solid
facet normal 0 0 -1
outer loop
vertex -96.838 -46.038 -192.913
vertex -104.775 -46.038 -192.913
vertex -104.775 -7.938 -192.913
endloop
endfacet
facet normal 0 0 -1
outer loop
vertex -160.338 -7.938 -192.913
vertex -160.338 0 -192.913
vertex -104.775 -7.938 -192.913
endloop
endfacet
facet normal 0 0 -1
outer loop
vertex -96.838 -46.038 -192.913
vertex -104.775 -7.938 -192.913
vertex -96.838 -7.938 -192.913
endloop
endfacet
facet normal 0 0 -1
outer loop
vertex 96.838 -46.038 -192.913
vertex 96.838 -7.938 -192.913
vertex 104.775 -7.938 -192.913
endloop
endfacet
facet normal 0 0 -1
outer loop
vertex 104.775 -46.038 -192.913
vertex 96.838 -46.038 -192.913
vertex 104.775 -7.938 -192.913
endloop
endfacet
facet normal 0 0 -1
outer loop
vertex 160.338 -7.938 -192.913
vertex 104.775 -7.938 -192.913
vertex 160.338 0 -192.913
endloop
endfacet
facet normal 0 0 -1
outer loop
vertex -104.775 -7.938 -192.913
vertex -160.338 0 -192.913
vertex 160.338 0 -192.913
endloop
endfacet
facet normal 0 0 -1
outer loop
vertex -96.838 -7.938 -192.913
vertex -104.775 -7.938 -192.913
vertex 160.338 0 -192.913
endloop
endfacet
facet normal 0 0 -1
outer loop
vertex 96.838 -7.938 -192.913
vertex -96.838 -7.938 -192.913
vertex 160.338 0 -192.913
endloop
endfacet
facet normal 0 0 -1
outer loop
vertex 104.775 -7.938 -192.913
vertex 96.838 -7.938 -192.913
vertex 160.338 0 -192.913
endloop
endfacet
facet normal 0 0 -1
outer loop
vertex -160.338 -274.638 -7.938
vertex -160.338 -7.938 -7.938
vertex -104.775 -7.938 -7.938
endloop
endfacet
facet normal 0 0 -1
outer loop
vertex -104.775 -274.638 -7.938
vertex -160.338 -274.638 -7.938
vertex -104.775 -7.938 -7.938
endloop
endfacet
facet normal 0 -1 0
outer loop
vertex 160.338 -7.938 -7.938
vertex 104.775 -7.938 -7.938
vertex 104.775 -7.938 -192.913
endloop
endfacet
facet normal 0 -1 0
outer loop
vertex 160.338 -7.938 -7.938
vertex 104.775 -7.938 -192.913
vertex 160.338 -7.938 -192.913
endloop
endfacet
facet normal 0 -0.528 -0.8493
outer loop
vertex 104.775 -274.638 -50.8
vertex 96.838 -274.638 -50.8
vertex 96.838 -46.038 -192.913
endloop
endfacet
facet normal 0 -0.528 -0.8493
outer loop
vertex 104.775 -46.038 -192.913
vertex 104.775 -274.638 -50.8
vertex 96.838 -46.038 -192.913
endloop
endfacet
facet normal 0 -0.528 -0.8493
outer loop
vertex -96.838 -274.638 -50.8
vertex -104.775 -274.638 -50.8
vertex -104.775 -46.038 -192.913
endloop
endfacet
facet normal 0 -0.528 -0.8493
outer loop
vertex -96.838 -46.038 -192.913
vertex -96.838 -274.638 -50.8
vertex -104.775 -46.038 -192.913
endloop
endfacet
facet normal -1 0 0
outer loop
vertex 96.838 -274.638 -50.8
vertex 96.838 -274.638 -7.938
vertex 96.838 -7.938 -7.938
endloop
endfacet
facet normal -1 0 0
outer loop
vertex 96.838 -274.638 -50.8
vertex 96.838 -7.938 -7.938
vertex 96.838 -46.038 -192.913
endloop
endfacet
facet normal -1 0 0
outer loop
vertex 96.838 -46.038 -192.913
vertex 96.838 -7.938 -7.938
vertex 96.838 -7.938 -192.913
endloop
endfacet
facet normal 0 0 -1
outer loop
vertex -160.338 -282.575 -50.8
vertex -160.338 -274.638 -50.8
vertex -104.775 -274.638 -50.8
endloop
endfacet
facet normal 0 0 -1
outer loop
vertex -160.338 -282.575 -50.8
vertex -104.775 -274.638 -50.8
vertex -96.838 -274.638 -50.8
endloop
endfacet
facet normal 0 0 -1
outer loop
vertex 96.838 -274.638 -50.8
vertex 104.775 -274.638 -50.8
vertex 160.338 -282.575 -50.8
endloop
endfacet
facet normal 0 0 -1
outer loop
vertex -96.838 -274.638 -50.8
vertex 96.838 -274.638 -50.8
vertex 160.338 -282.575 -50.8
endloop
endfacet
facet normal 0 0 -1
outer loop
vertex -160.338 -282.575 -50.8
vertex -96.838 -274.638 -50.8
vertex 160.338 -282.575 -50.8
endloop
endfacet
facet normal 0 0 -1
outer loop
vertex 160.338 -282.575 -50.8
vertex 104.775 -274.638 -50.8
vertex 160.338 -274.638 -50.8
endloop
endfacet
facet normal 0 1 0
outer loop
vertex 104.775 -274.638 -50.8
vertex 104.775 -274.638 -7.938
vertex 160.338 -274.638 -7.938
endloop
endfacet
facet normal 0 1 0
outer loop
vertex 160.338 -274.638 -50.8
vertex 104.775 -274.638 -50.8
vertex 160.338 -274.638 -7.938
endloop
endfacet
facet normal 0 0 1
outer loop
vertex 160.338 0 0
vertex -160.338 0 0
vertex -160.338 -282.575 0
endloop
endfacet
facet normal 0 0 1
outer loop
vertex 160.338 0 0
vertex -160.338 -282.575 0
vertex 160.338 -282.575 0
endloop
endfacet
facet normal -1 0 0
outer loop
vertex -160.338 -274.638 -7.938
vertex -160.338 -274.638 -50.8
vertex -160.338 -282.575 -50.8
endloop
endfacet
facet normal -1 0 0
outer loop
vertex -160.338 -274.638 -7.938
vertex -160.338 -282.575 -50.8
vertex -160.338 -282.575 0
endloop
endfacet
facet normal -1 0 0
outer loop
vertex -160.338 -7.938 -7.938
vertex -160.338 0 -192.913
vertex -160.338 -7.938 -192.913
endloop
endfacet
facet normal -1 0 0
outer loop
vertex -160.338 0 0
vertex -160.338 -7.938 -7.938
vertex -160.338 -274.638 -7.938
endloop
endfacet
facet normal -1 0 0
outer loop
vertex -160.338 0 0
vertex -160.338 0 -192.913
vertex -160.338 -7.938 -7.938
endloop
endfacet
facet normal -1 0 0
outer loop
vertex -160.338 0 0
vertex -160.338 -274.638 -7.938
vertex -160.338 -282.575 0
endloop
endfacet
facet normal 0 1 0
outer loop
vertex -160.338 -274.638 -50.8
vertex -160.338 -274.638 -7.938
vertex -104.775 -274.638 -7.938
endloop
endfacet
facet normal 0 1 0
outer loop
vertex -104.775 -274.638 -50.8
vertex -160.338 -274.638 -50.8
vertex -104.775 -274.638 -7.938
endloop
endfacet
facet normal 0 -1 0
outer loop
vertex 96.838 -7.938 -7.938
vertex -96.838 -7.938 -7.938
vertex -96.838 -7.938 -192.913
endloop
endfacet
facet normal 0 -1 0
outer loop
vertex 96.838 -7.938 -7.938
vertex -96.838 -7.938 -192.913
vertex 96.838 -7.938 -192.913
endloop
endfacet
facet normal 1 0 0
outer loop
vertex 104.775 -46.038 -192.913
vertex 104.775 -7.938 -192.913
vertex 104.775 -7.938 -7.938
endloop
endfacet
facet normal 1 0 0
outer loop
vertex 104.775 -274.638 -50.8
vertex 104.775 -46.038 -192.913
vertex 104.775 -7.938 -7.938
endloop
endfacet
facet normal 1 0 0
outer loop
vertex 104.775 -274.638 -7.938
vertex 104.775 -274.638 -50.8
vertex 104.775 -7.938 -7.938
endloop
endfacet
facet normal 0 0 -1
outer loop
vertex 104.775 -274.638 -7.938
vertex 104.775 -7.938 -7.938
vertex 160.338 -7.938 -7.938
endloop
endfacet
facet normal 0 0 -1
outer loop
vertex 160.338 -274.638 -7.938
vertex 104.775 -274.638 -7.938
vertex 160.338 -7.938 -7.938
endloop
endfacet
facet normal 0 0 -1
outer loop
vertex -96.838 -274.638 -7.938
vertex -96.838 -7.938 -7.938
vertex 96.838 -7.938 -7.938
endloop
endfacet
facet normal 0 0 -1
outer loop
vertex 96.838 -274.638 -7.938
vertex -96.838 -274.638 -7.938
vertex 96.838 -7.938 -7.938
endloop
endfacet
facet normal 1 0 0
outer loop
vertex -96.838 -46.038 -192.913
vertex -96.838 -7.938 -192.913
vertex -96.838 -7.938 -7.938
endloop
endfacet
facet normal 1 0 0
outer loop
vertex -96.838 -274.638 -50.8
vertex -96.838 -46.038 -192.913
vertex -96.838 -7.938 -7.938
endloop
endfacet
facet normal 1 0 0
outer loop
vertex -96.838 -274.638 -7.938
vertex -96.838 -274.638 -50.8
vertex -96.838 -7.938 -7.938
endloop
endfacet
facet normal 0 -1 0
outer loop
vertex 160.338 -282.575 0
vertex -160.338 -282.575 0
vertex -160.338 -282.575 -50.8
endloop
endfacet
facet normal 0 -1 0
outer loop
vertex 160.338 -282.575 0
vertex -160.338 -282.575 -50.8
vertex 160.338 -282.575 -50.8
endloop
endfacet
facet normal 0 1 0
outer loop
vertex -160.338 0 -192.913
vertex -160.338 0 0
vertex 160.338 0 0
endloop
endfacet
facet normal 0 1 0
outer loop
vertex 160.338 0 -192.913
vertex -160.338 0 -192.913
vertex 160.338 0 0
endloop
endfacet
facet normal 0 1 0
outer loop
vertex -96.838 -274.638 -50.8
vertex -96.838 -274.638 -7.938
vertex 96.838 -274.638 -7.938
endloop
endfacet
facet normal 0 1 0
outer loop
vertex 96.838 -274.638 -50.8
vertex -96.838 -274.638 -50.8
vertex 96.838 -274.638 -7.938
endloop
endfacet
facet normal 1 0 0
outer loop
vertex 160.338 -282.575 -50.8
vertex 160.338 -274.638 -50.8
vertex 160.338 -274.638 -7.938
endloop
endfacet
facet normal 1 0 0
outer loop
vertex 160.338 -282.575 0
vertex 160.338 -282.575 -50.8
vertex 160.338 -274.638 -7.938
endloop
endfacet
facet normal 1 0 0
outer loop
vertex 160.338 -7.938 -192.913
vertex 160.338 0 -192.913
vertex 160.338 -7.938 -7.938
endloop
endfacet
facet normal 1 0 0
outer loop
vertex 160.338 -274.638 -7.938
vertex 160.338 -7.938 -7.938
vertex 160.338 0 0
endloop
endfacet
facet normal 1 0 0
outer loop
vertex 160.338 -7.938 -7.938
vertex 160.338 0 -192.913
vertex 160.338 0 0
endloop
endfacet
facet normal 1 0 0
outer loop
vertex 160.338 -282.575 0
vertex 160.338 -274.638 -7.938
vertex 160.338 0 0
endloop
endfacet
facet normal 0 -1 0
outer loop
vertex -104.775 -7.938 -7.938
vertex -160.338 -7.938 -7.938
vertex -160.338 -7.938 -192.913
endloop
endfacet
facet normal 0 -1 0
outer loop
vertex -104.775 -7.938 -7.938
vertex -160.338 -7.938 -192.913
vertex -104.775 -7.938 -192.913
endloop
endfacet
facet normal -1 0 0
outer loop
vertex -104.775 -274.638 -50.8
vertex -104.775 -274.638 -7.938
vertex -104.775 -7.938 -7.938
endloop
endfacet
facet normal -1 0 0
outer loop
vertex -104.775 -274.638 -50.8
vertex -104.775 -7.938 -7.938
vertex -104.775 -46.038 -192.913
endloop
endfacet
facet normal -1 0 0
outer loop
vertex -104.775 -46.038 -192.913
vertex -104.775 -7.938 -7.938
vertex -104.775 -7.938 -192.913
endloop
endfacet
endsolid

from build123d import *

# Parameters (mm, degrees)
F0_W     = 320.675
F0_H     = 192.913
F1_DEPTH = 7.9375
F4_DEPTH = 266.7
F6_DEPTH = 265.1135
F8_W     = 320.675
F8_H     = 50.8
F9_DEPTH = 7.9375


with BuildPart() as f1:
    # F0 (on Front) → F1 (new body)
    with BuildSketch(Plane.XZ):
        with Locations((0, -96.4565)):
            Rectangle(F0_W, F0_H)
    extrude(amount=F1_DEPTH)

    # F3 (on face) → F4 (join)
    with BuildSketch(Plane.XZ.offset(7.9375)):
        Polygon((160.3375, 0), (-160.3375, 0), (-160.3375, -7.9375), (-104.775, -7.9375), (-104.775, -192.913), (-96.8375, -192.913), (-96.8375, -7.9375), (96.8375, -7.9375), (96.8375, -192.913), (104.775, -192.913), (104.775, -7.9375), (160.3375, -7.9375), align=None)
    extrude(amount=F4_DEPTH)

    # F5 (on face) → F6 (cut, through all)
    with BuildSketch(Plane(origin=(-104.775, 0, 0), x_dir=(0, -1, 0), z_dir=(-1, 0, 0))):
        Polygon((274.6375, -50.8), (46.0375, -192.913), (274.6375, -192.913), align=None)
    extrude(amount=-F6_DEPTH, mode=Mode.SUBTRACT)

    # F8 (on face) → F9 (join)
    with BuildSketch(Plane.XZ.offset(274.6375)):
        with Locations((0, -25.4)):
            Rectangle(F8_W, F8_H)
    extrude(amount=F9_DEPTH)


solid = f1.part
